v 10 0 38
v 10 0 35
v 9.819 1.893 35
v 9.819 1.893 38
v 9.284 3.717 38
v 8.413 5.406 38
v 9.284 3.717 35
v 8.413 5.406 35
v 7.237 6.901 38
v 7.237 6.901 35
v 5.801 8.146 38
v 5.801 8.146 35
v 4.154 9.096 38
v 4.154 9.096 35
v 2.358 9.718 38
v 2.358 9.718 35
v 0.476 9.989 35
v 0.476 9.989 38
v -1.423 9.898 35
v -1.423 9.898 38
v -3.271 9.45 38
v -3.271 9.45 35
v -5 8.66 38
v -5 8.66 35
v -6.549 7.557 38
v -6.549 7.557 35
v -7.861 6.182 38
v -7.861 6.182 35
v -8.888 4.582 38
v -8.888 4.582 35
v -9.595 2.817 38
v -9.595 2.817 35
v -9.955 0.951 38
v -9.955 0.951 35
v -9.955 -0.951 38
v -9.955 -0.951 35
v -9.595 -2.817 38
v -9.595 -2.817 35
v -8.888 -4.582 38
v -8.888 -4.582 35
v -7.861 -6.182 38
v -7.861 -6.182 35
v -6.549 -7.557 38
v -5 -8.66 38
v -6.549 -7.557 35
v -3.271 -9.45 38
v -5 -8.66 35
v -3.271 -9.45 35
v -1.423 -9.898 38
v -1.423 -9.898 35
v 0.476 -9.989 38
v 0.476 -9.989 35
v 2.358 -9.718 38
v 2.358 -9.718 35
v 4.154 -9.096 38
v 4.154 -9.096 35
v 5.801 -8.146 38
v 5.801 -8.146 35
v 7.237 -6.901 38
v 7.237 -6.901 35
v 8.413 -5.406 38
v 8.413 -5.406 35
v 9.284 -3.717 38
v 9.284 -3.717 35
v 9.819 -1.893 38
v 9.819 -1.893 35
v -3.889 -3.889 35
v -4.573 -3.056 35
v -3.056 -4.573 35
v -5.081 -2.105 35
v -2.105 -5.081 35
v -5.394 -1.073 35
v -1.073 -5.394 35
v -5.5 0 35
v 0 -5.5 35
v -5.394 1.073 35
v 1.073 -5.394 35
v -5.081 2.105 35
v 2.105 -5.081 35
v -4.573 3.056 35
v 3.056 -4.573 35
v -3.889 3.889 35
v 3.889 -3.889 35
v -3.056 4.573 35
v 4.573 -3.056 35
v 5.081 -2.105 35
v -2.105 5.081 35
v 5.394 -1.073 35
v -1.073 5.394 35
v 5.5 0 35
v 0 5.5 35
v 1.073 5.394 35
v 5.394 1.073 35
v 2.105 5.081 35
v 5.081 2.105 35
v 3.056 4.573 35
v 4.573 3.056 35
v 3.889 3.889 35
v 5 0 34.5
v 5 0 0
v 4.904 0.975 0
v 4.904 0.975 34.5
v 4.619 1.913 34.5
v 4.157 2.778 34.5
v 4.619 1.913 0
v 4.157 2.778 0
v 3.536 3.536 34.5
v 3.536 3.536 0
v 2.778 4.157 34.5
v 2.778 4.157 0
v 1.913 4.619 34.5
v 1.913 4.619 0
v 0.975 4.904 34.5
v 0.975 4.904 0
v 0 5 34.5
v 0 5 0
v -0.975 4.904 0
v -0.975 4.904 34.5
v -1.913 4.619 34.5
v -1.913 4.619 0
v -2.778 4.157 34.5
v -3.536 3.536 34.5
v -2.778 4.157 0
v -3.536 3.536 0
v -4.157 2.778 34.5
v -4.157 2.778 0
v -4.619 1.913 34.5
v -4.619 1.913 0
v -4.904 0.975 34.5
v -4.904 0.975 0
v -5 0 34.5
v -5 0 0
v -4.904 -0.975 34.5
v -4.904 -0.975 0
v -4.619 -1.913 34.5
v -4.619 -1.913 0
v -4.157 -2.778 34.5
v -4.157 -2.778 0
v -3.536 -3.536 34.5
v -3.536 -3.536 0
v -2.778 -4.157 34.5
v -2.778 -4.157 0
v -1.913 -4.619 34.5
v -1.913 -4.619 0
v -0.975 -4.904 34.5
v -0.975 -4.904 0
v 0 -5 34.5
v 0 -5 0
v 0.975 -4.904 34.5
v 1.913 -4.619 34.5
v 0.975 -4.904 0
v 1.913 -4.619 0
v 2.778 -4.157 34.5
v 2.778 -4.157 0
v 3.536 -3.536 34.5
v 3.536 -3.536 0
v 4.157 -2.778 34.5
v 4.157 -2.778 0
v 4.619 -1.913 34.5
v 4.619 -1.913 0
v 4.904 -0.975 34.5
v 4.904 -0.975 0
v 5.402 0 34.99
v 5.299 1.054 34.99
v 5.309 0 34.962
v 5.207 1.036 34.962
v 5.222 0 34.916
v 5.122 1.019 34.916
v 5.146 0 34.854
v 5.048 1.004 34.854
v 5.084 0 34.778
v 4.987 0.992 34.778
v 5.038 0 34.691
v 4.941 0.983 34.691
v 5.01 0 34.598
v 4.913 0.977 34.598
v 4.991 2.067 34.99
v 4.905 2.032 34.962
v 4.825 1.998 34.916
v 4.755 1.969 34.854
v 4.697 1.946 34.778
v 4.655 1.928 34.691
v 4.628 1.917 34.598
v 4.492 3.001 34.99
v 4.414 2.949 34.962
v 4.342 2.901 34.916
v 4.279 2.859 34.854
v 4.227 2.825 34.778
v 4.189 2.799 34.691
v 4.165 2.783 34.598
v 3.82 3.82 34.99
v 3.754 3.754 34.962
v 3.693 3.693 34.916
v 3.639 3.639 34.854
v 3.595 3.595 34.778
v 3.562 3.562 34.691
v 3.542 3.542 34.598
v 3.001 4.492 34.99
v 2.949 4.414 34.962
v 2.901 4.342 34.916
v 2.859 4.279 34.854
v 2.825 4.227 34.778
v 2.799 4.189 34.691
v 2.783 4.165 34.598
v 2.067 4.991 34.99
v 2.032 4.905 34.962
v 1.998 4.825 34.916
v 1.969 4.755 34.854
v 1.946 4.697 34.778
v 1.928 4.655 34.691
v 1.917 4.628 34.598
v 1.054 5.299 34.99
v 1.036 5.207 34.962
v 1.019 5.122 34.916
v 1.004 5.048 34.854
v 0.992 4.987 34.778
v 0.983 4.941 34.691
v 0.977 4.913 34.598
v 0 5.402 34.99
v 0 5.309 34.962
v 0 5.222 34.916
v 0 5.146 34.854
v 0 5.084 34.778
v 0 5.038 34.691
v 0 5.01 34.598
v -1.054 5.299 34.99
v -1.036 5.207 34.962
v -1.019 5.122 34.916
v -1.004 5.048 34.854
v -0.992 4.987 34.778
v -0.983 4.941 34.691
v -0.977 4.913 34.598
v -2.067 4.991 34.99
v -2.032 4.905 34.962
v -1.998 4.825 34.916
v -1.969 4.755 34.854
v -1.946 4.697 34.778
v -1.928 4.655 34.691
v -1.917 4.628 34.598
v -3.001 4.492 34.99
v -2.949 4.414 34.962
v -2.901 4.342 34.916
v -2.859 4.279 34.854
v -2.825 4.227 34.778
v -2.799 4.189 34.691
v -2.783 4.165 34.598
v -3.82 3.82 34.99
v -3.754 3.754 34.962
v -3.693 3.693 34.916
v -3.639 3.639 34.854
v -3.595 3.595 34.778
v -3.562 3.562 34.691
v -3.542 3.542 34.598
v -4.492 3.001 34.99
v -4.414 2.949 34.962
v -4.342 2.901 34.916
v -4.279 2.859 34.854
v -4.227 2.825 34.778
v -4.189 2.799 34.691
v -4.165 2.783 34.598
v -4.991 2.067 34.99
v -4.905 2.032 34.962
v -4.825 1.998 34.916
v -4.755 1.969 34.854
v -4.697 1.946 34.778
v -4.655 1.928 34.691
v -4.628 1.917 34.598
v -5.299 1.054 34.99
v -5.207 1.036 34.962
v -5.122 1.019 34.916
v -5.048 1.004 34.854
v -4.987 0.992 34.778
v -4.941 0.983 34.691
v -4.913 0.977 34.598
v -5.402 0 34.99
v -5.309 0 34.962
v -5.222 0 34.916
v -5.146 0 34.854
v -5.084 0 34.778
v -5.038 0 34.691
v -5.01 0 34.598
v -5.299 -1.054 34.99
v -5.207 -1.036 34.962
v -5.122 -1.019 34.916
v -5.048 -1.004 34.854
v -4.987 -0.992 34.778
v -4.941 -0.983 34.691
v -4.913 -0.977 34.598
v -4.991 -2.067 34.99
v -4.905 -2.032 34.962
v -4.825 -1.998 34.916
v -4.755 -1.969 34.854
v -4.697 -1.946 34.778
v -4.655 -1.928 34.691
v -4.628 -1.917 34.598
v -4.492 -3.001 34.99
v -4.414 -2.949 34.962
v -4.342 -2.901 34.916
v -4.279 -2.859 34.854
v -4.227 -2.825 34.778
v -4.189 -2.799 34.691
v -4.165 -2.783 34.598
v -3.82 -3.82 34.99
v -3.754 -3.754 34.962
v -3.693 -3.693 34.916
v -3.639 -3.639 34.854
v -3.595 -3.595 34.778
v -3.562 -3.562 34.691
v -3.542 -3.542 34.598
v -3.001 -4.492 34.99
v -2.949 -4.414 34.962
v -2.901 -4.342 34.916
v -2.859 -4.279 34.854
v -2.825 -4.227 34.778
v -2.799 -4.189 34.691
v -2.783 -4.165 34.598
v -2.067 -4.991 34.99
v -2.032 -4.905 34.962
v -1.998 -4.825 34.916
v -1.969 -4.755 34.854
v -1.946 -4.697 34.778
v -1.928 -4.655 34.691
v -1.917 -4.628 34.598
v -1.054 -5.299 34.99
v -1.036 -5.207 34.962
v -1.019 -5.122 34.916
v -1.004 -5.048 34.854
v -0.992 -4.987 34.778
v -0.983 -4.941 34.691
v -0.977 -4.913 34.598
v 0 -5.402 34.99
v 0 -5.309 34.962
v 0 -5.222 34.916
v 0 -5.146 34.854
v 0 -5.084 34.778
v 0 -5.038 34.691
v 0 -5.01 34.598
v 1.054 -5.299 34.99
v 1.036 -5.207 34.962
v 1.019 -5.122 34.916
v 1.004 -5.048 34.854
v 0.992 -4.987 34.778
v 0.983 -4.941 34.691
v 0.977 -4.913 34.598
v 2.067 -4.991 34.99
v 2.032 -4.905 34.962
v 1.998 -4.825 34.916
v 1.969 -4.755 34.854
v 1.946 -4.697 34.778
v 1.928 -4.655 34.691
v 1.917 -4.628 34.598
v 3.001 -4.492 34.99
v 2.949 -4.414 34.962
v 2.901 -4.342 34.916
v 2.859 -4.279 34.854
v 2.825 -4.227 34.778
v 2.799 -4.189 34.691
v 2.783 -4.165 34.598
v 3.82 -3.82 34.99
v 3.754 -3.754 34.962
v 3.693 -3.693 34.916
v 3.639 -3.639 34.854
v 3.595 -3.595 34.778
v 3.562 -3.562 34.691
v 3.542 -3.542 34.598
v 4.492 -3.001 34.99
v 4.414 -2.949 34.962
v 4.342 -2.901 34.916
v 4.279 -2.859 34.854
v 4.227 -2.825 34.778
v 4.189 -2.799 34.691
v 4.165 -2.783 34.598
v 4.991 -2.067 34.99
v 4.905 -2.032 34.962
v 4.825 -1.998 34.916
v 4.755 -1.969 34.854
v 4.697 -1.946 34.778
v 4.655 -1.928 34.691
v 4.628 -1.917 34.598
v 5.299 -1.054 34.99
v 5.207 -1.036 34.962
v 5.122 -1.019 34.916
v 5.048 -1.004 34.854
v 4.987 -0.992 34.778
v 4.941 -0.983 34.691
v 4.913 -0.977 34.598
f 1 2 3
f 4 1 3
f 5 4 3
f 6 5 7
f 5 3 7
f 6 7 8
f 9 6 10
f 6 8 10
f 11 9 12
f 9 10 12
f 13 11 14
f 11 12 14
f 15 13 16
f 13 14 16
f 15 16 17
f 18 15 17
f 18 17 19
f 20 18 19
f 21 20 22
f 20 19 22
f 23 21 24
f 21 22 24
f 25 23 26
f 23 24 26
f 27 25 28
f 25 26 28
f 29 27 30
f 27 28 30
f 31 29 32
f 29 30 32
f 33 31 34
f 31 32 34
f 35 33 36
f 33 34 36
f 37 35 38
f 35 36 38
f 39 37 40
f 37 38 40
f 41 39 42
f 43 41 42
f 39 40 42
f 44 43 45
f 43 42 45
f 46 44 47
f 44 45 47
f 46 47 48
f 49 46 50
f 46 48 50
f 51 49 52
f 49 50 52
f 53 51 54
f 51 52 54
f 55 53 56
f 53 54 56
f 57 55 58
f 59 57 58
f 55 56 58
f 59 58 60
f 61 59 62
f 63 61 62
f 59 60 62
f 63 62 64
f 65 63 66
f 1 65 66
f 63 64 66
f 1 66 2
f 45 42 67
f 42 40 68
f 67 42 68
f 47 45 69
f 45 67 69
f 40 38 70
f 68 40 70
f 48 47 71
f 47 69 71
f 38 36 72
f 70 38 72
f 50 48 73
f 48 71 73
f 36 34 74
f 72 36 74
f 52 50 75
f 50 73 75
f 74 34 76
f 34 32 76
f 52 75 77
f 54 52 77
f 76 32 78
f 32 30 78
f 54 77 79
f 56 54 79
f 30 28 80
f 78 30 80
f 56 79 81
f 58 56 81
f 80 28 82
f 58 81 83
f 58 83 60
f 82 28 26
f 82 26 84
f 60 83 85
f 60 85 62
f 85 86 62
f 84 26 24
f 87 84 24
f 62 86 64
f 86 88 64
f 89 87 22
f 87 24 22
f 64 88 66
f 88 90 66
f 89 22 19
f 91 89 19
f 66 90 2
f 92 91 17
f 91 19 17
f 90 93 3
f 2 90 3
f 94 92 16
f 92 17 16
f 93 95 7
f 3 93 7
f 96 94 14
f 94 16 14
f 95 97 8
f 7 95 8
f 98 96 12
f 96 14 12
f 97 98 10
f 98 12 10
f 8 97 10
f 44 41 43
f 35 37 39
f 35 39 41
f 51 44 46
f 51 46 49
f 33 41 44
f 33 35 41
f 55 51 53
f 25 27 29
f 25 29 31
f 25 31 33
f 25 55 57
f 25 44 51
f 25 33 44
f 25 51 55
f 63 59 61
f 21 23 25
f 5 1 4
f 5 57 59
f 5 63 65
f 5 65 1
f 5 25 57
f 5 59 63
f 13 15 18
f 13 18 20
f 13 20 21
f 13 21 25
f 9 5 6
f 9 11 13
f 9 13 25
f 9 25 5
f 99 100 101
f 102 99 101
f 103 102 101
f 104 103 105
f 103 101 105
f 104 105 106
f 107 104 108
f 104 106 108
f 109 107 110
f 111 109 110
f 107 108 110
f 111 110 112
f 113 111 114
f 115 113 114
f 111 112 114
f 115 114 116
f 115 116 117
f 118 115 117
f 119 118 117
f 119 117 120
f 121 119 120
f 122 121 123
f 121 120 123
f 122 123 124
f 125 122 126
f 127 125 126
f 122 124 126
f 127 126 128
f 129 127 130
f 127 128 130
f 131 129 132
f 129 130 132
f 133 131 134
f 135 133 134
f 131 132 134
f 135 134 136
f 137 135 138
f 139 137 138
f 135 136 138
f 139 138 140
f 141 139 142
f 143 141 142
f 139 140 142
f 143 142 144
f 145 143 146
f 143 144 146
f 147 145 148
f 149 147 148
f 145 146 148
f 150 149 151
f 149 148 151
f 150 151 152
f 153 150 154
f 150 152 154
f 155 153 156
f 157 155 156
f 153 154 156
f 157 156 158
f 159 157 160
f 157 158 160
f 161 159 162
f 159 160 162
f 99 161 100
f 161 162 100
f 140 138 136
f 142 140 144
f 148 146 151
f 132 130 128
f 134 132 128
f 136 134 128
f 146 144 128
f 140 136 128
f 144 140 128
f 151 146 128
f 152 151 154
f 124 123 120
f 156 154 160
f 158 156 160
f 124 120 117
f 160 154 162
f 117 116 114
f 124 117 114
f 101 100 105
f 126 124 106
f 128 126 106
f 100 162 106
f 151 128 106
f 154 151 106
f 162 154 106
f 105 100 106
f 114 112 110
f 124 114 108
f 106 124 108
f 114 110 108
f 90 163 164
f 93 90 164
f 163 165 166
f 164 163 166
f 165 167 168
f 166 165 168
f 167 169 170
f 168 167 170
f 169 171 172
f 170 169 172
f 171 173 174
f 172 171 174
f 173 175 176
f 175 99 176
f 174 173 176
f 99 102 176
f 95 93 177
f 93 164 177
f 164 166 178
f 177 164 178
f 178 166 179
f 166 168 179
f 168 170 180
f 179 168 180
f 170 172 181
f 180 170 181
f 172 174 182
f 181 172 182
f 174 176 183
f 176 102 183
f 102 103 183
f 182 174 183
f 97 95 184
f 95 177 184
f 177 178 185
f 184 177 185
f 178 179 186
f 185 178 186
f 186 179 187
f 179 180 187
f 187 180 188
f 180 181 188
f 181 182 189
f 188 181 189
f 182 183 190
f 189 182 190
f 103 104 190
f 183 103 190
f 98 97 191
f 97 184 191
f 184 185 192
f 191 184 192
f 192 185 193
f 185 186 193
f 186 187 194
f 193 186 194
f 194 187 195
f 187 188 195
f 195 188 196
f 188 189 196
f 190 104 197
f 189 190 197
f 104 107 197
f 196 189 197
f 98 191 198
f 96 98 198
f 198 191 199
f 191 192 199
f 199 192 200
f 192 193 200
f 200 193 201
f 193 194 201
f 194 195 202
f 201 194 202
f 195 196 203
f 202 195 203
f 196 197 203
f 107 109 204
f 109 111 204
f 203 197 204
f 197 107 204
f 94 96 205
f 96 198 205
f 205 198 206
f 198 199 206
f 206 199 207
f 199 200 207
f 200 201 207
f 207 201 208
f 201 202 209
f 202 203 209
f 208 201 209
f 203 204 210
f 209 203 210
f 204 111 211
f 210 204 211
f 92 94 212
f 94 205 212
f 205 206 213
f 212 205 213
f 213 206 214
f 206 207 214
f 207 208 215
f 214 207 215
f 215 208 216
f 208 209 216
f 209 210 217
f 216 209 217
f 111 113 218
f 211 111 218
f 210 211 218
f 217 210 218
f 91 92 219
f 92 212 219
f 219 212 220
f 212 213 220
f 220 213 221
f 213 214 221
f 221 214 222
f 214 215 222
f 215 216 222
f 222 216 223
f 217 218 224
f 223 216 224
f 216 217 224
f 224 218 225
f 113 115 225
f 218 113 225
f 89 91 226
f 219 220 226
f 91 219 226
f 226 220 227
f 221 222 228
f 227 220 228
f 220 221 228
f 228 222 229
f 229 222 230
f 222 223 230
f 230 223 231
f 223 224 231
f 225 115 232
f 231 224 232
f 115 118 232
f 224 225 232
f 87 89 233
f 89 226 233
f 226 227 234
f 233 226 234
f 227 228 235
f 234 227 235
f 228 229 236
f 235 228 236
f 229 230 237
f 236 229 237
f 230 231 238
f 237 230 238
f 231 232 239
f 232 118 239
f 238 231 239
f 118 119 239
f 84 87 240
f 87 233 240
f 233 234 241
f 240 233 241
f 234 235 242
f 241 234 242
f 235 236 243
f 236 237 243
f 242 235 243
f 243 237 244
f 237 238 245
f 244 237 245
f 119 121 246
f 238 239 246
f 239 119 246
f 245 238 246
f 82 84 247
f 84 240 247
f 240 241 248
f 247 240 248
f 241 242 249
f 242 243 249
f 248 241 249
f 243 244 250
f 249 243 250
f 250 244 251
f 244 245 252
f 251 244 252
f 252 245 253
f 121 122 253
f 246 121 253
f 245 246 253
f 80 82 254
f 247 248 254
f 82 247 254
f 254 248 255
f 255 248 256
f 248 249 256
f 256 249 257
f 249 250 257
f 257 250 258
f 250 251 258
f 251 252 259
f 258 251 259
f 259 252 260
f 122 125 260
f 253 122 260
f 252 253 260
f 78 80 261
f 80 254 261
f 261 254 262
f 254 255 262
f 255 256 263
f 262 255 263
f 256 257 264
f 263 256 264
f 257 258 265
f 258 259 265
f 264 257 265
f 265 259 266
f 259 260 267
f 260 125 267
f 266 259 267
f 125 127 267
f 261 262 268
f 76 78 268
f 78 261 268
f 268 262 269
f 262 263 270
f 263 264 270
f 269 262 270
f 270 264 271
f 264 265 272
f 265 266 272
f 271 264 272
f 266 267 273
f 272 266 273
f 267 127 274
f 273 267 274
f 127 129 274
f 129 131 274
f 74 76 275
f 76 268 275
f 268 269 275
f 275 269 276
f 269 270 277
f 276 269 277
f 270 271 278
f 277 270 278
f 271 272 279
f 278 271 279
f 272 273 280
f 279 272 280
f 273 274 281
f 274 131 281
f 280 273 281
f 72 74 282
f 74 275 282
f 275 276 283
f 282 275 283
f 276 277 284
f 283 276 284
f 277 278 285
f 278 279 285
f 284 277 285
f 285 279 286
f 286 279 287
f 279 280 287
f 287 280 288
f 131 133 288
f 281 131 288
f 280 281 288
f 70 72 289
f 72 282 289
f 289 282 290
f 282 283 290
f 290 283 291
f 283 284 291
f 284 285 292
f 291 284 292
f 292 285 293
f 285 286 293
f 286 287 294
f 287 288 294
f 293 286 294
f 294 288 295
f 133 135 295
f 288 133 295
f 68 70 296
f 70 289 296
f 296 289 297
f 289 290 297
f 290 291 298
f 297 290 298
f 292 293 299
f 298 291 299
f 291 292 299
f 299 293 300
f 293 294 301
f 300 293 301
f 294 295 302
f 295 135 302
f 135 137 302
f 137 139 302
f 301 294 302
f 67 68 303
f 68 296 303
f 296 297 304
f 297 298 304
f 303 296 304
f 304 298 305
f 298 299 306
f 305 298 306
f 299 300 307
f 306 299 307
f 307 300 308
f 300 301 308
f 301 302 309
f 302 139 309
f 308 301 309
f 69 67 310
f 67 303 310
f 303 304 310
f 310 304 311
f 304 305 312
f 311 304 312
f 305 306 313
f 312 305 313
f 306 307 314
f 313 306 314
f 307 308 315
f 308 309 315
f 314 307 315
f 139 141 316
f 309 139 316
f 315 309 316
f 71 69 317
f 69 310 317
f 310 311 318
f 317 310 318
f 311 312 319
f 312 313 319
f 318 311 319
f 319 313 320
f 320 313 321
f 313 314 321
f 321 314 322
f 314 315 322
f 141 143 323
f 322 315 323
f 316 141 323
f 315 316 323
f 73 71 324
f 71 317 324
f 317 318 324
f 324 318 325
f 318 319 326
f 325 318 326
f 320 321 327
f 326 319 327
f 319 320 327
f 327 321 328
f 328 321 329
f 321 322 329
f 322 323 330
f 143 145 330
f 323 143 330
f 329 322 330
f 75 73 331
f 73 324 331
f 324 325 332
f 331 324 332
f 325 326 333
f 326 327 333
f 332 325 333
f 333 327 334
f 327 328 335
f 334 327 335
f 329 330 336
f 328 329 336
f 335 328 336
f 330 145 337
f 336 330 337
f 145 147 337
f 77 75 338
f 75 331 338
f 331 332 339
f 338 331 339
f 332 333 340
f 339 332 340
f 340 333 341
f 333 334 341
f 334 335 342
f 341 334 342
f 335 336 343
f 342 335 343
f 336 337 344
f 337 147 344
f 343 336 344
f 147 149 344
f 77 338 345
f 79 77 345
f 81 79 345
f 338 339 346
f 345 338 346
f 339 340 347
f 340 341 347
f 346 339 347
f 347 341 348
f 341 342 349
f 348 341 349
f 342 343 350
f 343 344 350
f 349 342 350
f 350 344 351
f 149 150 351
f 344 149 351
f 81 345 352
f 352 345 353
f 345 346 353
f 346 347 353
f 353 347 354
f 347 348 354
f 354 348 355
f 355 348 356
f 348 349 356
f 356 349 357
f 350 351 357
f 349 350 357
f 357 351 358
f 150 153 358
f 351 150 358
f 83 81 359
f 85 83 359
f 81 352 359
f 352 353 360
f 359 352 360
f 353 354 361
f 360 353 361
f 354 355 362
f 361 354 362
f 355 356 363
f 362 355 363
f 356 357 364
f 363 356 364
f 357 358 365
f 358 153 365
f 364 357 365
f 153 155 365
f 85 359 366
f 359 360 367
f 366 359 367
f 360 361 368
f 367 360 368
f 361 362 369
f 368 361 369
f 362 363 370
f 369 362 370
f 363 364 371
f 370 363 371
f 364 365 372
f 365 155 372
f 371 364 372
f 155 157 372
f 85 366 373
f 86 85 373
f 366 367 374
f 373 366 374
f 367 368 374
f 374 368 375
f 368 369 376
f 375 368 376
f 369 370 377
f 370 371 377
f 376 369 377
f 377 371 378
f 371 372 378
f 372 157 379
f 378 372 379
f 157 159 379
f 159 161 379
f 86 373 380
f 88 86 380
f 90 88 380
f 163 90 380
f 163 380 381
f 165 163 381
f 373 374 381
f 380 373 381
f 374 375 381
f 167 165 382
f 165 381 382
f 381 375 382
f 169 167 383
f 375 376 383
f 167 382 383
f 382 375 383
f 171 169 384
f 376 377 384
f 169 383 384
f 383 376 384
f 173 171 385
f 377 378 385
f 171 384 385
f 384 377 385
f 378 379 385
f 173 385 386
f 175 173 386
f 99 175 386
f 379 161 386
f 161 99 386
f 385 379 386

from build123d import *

# Parameters (mm, degrees)
ESQUISSE1_R        = 5
BOSS_EXTRU_1_DEPTH = 35
ESQUISSE3_R        = 10
BOSS_EXTRU_2_DEPTH = 3
CONG_1_R           = 0.5


with BuildPart() as part:
    # Esquisse1 → Boss.-Extru.1 (new body)
    with BuildSketch(Plane.XY):
        Circle(ESQUISSE1_R)
    extrude(amount=BOSS_EXTRU_1_DEPTH)

    # Esquisse3 → Boss.-Extru.2 (add)
    with BuildSketch(Plane.XY.offset(35)):
        Circle(ESQUISSE3_R)
    extrude(amount=BOSS_EXTRU_2_DEPTH)

    # Congé1
    cong_1_edges = [part.edges().sort_by_distance(p)[0] for p in [
        (-5, 0, 35),
    ]]
    fillet(cong_1_edges, radius=CONG_1_R)


solid = part.part
